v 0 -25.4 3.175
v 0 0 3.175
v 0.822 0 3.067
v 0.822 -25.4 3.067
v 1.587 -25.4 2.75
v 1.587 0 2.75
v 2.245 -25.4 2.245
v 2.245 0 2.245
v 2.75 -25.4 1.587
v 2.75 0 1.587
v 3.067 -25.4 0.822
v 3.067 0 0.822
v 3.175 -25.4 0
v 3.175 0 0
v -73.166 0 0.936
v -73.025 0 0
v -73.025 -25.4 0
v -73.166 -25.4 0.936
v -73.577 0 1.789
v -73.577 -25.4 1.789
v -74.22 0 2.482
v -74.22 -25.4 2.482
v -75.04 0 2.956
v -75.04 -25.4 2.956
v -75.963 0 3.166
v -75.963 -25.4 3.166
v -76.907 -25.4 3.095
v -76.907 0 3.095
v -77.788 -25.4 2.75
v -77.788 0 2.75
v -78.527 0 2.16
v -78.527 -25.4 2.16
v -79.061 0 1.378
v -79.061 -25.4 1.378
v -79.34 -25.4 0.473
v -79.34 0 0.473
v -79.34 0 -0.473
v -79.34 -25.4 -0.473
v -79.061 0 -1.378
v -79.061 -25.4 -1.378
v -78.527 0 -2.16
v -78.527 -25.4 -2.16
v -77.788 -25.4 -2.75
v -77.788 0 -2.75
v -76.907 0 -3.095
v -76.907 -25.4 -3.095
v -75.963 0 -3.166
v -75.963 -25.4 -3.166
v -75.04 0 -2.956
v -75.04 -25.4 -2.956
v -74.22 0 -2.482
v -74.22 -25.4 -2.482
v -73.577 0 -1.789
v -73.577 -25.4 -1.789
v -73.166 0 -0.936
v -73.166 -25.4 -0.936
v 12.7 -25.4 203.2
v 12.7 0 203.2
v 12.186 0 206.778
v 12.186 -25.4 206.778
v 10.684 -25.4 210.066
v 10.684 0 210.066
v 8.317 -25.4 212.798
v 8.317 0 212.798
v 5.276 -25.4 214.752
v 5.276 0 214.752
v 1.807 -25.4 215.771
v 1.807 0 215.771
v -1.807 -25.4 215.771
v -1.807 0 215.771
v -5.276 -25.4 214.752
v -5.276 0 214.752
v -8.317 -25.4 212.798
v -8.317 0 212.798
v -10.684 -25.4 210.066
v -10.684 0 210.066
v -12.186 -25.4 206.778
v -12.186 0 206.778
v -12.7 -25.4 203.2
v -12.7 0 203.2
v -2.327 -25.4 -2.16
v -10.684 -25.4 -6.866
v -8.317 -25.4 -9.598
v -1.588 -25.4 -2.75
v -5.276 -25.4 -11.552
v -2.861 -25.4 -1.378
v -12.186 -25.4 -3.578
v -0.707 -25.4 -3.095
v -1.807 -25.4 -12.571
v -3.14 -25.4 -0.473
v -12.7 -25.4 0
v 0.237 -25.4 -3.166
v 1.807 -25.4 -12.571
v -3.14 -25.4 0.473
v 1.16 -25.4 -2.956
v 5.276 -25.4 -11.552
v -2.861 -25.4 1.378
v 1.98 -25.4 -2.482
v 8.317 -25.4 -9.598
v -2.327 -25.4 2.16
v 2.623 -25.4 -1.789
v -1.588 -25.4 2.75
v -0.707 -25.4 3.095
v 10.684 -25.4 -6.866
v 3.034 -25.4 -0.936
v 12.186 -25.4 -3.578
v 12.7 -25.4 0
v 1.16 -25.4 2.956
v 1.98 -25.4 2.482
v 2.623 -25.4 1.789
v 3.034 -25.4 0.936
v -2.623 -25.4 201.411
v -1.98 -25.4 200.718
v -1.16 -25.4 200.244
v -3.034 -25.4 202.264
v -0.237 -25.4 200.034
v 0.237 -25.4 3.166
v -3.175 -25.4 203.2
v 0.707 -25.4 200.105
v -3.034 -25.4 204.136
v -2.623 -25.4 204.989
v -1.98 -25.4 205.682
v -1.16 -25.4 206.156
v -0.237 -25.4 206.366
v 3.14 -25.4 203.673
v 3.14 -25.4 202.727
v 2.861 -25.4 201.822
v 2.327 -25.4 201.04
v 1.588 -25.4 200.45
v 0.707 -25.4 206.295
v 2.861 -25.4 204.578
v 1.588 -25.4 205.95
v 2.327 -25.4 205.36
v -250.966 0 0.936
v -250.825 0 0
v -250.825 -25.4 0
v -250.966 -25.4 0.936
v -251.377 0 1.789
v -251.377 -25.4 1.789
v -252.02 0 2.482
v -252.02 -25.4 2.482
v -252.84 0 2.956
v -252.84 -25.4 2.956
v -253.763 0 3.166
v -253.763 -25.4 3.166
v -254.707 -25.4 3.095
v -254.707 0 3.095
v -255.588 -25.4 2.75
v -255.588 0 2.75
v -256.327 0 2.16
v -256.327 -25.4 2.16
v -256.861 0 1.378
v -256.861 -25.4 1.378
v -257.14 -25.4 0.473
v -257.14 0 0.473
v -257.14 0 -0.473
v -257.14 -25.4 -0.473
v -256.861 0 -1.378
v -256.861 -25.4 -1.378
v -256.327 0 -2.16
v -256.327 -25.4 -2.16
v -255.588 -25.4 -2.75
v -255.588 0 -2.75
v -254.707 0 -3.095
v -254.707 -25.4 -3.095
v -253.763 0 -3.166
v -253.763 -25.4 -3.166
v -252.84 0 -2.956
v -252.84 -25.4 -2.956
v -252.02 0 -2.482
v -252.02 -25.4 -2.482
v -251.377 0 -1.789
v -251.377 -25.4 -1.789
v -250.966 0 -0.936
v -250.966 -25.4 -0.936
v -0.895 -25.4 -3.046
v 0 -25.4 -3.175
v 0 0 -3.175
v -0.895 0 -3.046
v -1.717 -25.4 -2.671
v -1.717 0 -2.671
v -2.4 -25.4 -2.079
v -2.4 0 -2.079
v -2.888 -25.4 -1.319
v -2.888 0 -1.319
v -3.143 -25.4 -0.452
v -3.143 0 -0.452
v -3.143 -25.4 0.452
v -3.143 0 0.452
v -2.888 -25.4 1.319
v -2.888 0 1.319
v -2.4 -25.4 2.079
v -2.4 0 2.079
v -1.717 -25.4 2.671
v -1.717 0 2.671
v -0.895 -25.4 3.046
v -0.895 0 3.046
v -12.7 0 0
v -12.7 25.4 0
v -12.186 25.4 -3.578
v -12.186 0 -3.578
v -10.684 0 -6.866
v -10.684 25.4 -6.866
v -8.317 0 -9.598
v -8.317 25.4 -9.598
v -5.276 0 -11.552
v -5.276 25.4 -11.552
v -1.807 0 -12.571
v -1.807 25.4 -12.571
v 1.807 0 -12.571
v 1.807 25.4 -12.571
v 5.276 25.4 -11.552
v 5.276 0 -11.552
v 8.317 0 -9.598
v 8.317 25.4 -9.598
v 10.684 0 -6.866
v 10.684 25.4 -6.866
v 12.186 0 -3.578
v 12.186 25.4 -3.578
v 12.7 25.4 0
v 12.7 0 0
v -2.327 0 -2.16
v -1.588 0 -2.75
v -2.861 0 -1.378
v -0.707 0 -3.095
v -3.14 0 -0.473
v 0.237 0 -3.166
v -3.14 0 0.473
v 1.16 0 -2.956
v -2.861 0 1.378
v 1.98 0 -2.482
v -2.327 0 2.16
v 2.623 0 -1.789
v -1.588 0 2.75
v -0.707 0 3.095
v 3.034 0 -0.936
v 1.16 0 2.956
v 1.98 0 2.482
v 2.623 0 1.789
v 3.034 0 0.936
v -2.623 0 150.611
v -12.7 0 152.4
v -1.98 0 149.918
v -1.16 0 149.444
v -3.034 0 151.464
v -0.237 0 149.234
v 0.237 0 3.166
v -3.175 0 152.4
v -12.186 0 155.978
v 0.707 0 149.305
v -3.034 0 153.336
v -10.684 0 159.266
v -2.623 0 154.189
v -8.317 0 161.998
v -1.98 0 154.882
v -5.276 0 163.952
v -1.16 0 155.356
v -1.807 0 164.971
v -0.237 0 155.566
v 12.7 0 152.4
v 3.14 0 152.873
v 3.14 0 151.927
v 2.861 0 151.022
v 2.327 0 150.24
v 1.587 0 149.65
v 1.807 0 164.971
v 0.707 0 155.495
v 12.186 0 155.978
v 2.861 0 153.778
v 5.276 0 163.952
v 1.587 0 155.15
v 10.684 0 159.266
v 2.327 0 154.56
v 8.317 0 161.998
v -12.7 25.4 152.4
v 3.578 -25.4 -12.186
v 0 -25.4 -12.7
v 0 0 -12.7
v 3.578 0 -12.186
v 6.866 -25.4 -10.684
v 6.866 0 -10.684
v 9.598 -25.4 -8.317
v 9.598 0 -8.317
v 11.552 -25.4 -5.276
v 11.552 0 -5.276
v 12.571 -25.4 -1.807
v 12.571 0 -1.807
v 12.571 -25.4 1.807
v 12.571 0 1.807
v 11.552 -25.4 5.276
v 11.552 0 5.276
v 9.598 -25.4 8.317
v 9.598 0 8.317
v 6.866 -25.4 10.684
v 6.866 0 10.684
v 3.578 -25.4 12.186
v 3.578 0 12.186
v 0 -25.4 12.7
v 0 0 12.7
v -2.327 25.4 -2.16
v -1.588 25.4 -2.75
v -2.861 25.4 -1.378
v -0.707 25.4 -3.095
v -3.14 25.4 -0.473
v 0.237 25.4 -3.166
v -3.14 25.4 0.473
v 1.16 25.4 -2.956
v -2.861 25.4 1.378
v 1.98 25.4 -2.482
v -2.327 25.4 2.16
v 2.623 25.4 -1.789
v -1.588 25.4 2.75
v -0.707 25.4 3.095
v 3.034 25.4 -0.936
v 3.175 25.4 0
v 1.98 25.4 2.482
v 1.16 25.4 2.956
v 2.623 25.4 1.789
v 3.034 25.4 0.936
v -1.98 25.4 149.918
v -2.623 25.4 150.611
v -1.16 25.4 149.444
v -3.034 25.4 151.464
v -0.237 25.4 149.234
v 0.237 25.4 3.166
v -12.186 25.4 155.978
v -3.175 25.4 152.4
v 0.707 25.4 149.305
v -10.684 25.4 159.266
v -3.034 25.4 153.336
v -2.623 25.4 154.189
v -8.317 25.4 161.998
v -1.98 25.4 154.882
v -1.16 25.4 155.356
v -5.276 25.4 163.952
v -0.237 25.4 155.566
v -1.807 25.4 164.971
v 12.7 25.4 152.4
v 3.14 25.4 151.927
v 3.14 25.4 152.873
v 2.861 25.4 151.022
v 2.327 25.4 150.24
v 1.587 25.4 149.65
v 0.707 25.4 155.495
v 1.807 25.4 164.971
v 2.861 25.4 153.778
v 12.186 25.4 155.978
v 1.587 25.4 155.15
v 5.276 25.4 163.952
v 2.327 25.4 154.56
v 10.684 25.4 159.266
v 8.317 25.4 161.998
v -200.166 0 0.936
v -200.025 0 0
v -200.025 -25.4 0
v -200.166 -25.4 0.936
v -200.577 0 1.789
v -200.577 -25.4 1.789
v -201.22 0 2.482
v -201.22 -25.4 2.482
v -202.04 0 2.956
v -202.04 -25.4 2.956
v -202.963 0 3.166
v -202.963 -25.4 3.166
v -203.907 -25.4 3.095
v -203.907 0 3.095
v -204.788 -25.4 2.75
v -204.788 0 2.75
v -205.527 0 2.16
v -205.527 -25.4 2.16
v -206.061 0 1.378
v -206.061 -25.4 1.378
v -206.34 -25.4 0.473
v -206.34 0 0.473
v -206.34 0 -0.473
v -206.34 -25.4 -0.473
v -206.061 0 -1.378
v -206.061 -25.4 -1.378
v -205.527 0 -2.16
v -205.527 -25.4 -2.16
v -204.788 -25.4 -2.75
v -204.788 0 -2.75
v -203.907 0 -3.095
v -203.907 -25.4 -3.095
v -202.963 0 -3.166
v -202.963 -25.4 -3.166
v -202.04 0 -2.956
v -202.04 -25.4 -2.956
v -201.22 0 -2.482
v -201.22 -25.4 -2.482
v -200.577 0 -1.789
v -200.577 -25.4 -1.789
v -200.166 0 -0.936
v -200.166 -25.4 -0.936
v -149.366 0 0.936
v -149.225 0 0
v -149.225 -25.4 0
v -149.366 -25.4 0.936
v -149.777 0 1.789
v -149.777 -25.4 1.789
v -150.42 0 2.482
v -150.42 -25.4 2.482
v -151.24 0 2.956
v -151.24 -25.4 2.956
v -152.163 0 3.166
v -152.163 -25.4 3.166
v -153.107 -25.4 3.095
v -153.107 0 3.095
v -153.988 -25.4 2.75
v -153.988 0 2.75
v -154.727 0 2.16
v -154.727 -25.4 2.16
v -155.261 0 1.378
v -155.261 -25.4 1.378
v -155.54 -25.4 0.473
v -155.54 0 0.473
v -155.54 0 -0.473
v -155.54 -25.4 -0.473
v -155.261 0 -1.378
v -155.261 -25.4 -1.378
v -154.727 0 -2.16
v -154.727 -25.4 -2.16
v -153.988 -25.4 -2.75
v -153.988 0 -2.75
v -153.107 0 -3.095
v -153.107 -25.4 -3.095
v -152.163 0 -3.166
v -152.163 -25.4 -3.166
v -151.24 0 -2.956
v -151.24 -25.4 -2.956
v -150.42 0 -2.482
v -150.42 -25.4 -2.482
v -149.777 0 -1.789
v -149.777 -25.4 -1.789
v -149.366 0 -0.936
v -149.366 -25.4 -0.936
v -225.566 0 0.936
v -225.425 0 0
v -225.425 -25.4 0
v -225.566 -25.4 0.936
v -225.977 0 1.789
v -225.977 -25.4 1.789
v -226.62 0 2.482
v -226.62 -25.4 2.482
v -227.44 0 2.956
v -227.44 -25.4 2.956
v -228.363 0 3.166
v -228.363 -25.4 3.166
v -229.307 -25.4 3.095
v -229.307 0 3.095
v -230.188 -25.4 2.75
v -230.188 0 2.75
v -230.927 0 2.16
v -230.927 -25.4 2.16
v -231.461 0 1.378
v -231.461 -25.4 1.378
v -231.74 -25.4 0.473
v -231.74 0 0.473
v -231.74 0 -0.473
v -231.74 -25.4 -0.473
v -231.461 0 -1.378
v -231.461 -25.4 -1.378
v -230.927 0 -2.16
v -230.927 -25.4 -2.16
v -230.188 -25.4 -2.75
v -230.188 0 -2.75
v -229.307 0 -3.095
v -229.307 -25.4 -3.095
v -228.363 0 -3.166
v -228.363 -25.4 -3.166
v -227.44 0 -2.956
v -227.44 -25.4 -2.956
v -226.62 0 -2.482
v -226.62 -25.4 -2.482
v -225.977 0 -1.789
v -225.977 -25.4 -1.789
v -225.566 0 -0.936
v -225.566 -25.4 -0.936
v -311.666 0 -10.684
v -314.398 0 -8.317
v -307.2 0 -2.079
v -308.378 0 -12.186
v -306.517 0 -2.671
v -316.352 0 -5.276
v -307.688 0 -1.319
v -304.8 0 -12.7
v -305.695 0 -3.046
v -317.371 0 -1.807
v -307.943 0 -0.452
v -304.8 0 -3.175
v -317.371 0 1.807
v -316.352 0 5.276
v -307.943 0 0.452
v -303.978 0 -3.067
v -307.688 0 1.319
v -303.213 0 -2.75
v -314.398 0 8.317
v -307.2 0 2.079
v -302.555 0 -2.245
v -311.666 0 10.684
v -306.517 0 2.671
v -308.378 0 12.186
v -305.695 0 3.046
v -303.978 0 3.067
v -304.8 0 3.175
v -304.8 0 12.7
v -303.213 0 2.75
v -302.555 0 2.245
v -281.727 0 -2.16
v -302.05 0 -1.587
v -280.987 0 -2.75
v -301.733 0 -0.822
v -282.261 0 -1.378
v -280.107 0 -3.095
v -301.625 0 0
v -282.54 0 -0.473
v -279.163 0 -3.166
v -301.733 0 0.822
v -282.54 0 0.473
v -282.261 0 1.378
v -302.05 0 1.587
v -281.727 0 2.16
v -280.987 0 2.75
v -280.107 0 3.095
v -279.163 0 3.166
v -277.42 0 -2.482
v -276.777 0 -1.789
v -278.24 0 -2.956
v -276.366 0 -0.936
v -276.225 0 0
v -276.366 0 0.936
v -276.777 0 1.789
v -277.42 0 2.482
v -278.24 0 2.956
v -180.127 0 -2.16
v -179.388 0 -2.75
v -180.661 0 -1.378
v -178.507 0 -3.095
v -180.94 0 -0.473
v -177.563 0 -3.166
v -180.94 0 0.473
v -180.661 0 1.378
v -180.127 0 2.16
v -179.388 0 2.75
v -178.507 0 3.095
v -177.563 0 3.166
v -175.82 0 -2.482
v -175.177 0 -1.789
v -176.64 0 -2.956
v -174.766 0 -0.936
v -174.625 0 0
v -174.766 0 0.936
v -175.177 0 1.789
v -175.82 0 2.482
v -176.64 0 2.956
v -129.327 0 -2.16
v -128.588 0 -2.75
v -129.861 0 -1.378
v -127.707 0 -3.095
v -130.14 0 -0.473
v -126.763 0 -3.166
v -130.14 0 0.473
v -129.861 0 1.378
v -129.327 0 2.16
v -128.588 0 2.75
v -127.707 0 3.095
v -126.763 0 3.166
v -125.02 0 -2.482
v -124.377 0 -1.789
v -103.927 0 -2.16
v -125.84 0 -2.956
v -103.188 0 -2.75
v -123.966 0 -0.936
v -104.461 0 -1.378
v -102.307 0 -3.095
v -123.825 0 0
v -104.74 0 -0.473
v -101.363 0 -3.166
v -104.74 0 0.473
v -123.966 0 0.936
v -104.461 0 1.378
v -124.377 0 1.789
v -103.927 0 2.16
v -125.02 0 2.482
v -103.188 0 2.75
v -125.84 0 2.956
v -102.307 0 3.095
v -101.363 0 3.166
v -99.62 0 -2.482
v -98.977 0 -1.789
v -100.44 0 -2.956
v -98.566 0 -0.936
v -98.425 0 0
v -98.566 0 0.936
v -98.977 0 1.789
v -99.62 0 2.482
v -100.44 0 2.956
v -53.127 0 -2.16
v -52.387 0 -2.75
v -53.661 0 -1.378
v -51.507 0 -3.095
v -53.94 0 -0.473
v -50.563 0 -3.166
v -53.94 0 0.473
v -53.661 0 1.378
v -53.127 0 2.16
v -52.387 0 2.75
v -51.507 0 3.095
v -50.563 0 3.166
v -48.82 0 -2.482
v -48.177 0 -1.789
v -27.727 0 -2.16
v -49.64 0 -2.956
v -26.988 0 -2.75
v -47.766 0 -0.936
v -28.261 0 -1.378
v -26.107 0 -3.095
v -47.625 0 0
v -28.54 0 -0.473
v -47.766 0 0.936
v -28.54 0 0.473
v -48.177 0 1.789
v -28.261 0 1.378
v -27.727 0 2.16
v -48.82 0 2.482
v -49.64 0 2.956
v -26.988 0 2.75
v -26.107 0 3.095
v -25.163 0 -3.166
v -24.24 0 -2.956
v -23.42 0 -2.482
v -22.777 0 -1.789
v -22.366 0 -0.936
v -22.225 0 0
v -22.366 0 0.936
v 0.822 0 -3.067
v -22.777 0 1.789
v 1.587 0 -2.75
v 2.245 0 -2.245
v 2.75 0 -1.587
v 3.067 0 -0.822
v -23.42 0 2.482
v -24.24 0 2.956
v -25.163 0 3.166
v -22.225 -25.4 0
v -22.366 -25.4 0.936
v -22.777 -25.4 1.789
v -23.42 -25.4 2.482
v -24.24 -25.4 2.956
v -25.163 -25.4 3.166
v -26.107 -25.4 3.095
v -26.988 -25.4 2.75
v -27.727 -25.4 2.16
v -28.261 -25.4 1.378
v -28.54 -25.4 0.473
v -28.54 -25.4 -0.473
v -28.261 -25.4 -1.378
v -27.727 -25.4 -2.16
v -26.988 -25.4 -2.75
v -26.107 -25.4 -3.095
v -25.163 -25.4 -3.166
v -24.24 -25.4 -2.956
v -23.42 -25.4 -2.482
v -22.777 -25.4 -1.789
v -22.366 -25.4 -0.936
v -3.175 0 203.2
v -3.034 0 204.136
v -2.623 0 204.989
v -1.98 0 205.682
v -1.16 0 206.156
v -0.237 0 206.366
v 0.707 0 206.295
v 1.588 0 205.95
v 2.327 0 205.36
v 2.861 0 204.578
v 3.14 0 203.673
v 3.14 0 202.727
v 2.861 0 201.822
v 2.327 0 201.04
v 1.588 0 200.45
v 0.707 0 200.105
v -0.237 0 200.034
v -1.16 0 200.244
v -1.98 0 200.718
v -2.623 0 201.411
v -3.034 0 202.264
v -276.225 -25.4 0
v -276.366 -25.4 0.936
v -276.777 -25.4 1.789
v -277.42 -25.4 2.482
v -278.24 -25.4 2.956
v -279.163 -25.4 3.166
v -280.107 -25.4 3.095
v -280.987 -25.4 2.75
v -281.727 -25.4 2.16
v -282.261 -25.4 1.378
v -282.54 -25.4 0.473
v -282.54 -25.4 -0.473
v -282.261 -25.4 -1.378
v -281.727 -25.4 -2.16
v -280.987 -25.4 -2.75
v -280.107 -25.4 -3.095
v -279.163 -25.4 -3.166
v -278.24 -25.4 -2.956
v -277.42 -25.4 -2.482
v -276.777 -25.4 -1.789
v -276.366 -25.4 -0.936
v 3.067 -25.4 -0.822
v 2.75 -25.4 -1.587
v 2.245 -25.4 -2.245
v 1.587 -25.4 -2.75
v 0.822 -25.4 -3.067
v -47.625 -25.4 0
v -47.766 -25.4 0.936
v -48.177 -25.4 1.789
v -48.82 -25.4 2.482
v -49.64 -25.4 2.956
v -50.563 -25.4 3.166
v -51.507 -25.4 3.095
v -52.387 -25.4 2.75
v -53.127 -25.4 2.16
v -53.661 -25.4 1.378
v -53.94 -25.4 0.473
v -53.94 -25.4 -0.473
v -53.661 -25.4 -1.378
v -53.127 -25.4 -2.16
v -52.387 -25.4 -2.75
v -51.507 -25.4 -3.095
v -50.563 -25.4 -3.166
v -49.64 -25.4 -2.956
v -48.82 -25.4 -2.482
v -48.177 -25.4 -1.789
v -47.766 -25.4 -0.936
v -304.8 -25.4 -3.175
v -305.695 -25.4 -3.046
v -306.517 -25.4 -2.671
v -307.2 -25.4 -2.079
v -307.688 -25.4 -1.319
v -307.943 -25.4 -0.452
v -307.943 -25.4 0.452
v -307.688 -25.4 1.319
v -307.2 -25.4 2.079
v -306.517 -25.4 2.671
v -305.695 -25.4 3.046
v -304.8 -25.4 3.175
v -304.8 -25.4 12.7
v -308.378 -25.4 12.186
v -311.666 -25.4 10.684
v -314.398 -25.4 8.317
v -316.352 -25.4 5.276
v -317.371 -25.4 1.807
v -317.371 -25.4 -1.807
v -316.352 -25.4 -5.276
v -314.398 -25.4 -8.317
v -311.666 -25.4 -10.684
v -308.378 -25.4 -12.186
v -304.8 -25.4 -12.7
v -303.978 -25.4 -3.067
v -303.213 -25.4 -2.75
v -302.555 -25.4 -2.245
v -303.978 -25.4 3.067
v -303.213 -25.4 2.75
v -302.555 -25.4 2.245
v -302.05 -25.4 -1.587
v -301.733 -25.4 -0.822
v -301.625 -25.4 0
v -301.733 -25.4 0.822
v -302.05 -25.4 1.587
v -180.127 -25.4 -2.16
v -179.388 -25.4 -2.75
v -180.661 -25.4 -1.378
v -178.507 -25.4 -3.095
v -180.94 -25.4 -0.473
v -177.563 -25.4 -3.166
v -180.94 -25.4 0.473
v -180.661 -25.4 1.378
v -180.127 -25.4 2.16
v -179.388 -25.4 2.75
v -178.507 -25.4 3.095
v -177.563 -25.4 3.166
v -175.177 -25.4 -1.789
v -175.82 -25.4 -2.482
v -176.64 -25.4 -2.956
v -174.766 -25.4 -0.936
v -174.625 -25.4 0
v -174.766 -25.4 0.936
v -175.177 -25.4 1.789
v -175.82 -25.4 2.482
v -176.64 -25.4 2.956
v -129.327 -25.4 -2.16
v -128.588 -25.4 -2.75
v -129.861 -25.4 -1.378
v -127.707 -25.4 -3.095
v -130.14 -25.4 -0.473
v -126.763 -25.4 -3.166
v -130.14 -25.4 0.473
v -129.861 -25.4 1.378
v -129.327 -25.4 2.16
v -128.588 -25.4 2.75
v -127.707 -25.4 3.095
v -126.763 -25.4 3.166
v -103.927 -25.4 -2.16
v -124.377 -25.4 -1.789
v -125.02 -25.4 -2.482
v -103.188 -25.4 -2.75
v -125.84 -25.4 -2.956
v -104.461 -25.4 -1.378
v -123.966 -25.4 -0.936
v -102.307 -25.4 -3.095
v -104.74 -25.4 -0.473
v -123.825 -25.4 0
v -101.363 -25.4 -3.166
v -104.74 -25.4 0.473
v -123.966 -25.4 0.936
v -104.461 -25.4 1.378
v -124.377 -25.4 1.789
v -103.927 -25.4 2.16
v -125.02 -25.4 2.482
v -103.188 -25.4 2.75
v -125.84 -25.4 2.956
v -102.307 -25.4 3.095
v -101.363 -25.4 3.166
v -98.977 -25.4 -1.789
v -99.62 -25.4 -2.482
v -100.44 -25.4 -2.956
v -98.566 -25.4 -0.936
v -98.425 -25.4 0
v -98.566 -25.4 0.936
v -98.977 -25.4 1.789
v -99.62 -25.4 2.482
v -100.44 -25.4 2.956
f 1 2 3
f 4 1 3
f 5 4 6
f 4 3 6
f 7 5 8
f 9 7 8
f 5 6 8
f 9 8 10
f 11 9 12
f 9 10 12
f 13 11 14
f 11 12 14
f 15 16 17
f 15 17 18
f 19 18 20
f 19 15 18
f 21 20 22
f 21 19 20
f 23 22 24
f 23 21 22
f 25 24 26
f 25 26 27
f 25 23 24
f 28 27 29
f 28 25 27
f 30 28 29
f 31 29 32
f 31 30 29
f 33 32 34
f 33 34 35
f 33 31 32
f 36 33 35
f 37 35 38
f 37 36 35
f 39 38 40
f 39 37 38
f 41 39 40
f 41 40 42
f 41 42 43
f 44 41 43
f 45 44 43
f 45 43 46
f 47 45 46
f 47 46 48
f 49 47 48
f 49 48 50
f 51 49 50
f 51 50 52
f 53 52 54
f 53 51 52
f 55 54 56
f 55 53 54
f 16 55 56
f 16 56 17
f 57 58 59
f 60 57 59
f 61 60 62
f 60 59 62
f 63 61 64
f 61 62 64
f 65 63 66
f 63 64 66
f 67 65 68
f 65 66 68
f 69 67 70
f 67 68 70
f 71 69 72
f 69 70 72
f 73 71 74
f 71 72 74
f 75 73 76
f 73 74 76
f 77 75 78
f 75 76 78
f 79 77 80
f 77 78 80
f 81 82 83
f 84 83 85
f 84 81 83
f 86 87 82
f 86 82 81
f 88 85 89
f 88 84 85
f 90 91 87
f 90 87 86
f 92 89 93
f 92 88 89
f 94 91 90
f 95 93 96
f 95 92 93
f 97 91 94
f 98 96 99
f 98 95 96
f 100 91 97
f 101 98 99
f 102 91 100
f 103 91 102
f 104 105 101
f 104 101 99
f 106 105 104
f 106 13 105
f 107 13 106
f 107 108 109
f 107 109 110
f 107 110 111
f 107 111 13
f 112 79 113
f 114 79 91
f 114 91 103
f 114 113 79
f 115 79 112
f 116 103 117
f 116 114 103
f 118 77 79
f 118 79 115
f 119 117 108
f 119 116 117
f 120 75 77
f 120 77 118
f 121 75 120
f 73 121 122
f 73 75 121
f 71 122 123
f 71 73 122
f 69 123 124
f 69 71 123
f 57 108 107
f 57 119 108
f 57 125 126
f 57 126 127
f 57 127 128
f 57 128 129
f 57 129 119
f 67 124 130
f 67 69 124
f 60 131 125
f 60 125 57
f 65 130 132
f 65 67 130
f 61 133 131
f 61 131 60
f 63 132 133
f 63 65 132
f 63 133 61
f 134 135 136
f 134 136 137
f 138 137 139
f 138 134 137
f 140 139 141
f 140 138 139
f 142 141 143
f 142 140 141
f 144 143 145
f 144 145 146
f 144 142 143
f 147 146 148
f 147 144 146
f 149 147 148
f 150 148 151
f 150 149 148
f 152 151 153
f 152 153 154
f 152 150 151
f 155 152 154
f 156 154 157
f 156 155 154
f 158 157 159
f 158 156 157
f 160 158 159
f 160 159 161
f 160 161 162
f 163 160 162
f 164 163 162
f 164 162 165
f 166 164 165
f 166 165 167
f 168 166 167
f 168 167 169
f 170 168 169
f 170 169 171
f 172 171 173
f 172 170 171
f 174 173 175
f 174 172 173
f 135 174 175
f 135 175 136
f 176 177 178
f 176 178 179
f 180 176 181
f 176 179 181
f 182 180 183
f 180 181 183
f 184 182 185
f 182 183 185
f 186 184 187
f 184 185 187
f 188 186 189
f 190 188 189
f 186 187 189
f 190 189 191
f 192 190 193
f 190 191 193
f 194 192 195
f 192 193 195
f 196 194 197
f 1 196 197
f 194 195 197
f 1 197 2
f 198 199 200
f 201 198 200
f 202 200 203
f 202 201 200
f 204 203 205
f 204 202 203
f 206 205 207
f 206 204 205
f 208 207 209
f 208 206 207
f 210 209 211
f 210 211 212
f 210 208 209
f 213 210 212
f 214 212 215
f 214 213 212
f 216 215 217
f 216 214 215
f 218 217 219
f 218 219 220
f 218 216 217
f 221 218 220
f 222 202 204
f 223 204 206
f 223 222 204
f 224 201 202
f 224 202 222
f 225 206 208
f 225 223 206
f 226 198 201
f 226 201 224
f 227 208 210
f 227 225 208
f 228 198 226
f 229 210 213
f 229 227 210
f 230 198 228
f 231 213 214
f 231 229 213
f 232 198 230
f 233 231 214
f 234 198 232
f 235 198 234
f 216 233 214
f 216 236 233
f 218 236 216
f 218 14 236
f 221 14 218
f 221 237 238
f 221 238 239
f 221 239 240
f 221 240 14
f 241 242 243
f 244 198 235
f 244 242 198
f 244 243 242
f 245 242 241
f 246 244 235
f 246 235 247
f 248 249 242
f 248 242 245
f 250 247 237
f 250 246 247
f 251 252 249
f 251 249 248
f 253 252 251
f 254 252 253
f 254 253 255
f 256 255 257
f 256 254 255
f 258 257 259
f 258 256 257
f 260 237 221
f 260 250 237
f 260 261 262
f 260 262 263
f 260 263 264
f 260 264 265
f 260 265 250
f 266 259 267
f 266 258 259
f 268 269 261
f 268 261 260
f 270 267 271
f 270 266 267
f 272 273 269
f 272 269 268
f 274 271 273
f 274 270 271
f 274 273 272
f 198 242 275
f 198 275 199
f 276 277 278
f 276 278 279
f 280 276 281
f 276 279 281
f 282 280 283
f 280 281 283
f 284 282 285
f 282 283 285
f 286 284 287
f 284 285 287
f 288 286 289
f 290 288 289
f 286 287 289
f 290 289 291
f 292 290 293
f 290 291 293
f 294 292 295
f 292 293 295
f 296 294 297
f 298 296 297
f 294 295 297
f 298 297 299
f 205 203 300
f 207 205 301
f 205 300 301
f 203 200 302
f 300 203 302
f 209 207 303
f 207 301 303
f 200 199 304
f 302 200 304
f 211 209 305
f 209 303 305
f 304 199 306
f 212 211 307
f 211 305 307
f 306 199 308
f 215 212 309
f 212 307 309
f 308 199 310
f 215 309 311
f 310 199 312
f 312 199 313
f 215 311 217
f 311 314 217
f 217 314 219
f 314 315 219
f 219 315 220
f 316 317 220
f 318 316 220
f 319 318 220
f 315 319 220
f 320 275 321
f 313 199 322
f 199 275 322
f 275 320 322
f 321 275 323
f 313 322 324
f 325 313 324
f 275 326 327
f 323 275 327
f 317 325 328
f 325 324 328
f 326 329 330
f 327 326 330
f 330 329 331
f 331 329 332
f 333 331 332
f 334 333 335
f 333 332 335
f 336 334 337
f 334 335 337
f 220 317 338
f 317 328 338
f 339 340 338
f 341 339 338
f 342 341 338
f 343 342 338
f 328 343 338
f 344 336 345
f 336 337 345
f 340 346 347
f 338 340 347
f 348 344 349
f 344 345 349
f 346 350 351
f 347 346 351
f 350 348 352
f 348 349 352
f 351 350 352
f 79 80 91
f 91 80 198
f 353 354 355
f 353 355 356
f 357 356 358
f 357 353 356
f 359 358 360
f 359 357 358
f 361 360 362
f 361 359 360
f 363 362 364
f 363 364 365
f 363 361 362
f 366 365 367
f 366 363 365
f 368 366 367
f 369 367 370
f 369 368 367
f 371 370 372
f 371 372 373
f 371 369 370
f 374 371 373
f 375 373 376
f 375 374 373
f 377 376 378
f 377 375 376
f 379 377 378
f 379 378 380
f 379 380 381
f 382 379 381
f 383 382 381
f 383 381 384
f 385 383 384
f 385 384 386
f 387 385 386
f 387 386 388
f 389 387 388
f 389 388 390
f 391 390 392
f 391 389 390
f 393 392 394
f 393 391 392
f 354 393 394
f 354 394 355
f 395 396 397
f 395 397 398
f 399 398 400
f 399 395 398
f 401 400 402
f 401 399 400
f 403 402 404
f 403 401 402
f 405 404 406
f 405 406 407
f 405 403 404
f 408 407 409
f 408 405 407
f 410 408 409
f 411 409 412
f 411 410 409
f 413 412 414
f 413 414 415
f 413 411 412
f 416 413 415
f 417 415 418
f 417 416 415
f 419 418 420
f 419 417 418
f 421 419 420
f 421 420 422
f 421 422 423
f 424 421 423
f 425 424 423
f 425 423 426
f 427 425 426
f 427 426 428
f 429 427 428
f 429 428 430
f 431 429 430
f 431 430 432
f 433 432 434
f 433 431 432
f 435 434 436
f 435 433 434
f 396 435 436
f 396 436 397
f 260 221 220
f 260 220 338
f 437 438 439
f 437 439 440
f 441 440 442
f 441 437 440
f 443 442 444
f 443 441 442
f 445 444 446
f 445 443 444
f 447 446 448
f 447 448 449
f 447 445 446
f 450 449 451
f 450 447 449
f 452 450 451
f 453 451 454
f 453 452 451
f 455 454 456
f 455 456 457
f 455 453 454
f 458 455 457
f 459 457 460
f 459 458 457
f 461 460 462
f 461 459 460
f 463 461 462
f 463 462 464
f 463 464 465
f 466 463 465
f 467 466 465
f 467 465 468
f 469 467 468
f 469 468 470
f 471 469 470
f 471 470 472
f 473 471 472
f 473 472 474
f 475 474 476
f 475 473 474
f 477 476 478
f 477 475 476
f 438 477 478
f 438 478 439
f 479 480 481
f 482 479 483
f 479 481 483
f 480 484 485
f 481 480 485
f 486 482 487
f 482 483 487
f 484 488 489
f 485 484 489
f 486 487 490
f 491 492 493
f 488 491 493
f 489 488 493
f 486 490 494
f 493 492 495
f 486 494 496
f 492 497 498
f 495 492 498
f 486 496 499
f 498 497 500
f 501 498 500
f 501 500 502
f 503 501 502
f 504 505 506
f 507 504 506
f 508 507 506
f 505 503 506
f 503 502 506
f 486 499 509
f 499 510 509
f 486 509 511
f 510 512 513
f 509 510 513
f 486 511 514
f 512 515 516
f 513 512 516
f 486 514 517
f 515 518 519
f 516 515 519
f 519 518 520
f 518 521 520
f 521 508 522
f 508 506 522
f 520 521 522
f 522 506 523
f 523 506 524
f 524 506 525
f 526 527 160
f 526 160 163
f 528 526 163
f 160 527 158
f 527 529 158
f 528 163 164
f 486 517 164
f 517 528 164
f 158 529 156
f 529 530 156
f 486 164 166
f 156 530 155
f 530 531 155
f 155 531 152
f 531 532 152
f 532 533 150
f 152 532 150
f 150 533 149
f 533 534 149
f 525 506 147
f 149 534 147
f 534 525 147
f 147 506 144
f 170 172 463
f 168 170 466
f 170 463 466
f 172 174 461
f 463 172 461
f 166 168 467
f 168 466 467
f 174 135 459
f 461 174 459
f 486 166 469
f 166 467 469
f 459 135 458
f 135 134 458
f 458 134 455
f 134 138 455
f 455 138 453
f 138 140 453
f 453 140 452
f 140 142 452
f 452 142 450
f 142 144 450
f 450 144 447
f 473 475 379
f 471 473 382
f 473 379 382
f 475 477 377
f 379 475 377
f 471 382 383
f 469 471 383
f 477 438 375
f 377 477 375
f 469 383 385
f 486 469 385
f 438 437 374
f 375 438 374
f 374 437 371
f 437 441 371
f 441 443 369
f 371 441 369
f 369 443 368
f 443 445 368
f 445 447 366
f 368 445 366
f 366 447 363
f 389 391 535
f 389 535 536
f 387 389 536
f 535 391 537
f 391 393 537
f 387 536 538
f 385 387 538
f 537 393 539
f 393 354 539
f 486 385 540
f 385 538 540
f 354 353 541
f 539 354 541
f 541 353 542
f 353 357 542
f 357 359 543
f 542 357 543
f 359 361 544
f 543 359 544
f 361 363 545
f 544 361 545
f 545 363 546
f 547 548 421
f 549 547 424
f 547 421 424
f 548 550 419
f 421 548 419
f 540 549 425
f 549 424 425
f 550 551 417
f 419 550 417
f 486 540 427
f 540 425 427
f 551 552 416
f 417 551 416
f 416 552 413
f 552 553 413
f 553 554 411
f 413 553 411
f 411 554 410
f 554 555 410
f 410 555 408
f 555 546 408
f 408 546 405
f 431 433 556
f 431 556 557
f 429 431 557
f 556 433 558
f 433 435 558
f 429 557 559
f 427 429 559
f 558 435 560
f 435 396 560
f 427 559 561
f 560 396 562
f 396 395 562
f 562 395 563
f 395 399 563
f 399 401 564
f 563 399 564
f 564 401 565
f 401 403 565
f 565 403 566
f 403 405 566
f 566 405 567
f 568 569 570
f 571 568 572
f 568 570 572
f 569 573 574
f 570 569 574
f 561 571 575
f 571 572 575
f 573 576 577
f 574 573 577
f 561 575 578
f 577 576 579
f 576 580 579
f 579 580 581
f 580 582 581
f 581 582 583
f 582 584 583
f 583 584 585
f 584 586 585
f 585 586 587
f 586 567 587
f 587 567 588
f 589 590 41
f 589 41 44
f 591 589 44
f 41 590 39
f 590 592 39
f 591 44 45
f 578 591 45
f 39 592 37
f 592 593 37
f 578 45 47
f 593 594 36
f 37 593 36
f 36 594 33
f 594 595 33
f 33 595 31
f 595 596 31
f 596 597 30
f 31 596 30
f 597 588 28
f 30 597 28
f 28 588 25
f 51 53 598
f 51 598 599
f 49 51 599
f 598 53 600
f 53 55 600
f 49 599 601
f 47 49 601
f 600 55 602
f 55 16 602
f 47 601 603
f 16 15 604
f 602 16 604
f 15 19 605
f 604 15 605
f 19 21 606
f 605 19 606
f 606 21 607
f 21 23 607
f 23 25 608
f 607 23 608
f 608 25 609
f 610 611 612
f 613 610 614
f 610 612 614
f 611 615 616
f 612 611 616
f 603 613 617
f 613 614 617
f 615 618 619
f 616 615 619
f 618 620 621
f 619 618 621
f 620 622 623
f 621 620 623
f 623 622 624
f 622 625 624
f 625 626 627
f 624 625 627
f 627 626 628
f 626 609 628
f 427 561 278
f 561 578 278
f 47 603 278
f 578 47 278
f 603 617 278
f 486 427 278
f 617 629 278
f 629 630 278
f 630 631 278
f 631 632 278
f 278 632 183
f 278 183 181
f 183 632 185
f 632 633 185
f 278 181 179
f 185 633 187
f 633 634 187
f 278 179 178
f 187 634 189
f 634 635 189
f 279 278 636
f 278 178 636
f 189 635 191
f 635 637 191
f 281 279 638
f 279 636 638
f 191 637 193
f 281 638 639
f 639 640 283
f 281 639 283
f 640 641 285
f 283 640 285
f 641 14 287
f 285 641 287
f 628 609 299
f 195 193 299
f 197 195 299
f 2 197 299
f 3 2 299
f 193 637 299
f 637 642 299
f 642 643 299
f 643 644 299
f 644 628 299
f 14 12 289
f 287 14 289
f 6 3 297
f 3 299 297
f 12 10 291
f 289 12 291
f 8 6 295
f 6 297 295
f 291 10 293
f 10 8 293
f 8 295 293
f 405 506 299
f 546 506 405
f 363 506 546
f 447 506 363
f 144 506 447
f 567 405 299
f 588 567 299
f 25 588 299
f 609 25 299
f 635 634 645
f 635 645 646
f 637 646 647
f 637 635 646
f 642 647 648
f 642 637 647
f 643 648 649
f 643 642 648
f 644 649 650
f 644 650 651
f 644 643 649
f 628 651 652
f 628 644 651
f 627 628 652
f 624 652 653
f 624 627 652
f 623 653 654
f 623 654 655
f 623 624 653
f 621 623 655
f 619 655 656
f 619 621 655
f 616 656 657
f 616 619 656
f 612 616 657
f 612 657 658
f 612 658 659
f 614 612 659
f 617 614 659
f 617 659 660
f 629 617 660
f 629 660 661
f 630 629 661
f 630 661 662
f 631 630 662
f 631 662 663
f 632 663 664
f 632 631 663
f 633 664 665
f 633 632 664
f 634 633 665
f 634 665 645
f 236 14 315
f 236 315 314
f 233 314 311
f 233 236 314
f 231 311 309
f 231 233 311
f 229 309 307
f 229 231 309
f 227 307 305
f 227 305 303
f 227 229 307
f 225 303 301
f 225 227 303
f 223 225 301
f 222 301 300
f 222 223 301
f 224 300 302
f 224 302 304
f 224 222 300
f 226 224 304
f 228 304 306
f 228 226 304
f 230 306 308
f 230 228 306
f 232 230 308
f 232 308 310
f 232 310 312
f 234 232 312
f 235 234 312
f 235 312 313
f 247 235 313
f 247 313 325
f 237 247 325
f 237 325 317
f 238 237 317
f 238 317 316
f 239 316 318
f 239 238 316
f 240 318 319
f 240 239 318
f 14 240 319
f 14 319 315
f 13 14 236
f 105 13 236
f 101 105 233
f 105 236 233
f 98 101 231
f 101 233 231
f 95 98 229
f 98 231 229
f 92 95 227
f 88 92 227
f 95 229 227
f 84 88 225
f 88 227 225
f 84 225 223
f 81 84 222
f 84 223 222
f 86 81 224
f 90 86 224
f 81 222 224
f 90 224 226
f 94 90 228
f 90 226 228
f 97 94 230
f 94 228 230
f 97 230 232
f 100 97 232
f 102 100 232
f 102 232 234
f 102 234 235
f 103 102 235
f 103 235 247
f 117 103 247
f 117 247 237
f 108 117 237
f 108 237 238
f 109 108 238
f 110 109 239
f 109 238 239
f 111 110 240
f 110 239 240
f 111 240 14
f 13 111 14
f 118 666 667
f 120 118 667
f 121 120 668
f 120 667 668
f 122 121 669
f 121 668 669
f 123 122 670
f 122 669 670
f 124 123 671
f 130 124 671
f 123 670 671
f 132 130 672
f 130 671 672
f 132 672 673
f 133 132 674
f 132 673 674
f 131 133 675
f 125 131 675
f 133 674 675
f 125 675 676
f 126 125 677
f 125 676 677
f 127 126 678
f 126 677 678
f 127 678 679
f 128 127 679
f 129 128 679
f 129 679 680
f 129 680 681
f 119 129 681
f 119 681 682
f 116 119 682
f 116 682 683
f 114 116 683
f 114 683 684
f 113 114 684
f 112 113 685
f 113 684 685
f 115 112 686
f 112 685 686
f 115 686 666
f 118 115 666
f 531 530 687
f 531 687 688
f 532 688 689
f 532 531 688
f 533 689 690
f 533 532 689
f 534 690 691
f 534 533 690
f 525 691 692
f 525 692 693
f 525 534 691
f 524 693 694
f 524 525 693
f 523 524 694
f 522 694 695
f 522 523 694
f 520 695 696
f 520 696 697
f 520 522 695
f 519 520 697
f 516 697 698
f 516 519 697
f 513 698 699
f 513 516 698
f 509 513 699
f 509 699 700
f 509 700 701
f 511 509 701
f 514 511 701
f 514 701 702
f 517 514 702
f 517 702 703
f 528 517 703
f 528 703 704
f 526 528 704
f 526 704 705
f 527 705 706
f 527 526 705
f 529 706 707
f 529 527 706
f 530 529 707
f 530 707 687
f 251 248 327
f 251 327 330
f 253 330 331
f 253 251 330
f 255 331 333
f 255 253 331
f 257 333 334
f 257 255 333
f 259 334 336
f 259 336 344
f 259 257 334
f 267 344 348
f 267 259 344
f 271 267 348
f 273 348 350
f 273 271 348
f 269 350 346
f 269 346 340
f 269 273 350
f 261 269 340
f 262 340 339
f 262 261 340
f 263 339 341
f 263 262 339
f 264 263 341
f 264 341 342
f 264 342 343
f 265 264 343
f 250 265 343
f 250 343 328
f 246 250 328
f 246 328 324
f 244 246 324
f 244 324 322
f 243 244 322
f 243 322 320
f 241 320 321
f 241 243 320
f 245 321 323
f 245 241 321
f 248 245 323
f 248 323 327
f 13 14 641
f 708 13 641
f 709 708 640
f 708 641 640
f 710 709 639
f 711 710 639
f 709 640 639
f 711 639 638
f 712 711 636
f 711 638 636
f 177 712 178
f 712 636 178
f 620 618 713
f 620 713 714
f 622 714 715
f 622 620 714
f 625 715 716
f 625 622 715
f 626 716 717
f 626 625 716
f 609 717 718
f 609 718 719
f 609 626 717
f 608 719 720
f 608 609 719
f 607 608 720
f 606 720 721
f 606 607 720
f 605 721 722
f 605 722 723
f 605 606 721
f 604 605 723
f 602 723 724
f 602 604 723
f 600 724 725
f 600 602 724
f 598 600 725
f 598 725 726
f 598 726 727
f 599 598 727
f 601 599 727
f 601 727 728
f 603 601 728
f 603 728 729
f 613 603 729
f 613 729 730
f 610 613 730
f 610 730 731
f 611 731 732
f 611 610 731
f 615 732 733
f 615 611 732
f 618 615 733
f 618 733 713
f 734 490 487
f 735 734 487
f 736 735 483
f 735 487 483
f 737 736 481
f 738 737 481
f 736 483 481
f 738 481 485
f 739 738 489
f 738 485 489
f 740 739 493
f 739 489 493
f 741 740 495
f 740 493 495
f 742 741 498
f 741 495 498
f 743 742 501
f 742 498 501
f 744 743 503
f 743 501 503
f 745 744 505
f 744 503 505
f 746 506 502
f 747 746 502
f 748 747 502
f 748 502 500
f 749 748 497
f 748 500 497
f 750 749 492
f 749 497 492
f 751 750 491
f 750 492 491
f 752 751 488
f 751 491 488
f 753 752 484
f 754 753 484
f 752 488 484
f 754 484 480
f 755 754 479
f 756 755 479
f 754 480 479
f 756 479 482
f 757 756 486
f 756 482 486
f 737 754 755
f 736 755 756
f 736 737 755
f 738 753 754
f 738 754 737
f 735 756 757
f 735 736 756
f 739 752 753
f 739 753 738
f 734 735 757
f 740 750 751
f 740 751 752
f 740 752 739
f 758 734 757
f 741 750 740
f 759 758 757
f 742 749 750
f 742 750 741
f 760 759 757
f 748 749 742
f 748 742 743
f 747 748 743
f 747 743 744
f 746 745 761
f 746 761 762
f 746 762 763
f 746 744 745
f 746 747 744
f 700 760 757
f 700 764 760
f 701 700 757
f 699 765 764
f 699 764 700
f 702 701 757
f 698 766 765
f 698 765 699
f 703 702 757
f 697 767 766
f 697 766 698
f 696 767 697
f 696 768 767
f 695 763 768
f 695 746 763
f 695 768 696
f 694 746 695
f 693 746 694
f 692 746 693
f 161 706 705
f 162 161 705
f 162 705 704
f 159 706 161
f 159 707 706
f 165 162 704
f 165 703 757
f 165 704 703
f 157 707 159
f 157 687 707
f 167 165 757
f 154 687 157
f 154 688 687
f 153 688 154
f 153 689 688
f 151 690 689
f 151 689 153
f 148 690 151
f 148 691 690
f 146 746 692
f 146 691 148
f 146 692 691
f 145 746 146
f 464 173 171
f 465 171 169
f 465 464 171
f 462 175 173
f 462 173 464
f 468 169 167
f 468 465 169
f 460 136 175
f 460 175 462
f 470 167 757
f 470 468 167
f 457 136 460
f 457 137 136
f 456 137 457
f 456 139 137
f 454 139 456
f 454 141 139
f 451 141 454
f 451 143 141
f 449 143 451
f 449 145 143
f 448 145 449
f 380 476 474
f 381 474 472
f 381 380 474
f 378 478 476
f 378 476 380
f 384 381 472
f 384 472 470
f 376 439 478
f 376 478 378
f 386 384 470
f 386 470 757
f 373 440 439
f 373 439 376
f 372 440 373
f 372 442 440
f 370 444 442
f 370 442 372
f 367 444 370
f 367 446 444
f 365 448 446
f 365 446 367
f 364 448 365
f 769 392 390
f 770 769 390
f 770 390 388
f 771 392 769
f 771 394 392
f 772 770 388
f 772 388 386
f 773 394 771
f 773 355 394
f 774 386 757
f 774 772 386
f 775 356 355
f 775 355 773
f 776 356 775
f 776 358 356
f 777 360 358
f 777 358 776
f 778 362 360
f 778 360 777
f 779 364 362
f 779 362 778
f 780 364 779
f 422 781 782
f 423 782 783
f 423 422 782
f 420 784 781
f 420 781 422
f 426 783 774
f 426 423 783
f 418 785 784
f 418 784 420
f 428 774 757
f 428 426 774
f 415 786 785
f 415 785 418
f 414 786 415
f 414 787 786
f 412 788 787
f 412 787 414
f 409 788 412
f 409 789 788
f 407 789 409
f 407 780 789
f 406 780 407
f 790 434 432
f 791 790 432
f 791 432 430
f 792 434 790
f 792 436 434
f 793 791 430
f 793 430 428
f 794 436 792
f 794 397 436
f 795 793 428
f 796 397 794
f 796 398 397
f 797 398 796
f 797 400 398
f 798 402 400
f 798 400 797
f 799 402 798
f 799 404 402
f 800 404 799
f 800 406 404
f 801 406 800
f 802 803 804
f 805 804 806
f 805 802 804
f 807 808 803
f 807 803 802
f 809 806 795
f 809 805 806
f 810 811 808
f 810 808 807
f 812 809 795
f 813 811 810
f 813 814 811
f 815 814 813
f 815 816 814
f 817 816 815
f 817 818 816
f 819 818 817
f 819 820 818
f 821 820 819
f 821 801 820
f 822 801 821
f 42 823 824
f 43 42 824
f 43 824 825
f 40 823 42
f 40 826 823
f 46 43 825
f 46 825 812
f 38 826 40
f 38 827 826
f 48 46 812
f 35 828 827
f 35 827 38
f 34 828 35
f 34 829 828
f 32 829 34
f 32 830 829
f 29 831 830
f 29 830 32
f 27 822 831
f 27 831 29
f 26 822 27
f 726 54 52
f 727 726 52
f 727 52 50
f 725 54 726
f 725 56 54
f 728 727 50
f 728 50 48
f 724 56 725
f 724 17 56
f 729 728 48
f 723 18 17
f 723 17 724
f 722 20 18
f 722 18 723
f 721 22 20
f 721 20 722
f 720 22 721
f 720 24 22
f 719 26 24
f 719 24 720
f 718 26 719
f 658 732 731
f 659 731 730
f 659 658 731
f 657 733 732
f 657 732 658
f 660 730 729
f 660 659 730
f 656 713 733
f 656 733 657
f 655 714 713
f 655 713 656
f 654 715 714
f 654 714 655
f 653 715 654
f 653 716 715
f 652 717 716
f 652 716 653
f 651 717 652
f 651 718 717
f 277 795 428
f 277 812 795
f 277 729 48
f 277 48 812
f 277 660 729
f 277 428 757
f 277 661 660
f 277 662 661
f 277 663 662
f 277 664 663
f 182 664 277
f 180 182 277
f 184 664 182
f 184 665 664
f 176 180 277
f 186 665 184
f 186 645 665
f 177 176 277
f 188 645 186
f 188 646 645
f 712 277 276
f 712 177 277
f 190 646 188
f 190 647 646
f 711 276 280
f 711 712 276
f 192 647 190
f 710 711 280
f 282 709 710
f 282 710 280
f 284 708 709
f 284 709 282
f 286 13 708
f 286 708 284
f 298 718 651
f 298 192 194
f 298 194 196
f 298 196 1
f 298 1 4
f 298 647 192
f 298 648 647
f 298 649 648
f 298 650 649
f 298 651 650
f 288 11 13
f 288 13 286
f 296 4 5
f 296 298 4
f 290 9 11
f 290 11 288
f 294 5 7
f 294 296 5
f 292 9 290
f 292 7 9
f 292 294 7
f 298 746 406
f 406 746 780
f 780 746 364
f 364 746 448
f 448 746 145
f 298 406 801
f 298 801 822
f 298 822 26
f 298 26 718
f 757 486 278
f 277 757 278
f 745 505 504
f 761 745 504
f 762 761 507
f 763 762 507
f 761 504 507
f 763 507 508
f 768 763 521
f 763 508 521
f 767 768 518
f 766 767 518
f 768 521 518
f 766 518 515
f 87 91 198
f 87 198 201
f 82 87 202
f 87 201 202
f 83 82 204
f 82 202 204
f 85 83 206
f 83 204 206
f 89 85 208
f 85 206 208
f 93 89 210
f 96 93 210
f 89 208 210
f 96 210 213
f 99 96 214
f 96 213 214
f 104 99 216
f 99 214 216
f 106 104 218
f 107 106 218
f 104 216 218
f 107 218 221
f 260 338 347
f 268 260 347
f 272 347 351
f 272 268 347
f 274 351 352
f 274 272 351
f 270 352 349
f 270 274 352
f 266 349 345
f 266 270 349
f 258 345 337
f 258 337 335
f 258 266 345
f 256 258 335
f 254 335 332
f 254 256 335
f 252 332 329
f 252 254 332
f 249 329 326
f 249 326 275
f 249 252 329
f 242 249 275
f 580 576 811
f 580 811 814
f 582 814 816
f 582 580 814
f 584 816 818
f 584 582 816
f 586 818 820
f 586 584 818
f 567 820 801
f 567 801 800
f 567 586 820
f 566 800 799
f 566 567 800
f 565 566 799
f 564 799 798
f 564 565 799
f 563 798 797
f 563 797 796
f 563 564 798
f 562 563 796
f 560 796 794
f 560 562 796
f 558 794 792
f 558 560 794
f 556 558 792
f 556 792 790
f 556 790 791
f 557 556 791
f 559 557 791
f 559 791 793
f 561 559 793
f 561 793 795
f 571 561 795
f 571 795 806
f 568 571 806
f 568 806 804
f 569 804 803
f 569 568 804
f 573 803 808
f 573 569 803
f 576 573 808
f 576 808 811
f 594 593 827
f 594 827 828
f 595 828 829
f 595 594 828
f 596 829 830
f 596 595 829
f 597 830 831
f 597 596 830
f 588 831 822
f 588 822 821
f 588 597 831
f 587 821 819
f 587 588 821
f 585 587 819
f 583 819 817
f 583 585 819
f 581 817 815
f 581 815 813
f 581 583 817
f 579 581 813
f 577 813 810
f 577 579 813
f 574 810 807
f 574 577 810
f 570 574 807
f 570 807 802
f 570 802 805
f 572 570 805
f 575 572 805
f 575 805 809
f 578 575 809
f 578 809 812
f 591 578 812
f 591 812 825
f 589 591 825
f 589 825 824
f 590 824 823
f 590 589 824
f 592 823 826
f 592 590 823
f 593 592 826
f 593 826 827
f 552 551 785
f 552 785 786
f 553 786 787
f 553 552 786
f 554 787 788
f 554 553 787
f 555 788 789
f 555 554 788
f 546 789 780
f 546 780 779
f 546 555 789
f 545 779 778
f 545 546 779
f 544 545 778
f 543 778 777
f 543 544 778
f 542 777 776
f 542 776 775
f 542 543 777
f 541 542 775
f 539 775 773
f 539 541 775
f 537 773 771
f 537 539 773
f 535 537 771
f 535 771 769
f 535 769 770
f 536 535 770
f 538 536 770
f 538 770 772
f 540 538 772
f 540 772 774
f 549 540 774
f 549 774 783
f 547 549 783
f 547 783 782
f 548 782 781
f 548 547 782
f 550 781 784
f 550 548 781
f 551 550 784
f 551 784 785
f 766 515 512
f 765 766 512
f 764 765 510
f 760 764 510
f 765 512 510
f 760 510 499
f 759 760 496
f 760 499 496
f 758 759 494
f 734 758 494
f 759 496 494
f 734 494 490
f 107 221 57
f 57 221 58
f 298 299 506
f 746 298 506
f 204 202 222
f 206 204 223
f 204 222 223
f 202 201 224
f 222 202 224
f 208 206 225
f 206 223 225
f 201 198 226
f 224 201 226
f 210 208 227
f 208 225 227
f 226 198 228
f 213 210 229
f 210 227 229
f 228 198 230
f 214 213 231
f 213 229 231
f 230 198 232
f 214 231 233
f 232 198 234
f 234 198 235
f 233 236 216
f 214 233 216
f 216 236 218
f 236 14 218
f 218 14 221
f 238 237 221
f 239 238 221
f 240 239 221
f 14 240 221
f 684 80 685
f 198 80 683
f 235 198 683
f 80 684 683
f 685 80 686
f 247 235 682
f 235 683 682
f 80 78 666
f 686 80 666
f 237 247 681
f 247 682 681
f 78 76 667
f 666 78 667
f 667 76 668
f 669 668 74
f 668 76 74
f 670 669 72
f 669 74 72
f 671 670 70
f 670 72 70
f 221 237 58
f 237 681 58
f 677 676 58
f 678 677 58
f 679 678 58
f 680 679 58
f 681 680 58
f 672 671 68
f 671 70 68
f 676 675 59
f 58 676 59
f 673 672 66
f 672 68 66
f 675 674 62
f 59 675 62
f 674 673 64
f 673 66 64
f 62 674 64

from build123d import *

# Parameters (mm, degrees)
F1_DEPTH = 25.4
F3_DEPTH = 25.4
F4_R     = 3.175
F5_DEPTH = 25.4


with BuildPart() as f1:
    # F0 (on Front) → F1 (new body)
    with BuildSketch(Plane.XZ):
        with BuildLine():
            ThreePointArc((-3.175, 0), (0, 3.175), (3.175, 0))
            Line((3.175, 0), (12.7, 0))
            Line((12.7, 0), (12.7, 203.2))
            Line((12.7, 203.2), (3.175, 203.2))
            ThreePointArc((3.175, 203.2), (0, 200.025), (-3.175, 203.2))
            Line((-3.175, 203.2), (-12.7, 203.2))
            Line((-12.7, 203.2), (-12.7, 0))
            Line((-12.7, 0), (-3.175, 0))
        make_face()
        with BuildLine():
            Line((12.7, 0), (3.175, 0))
            ThreePointArc((3.175, 0), (0, -3.175), (-3.175, 0))
            Line((-3.175, 0), (-12.7, 0))
            ThreePointArc((-12.7, 0), (0, -12.7), (12.7, 0))
        make_face()
        with BuildLine():
            Line((3.175, 203.2), (12.7, 203.2))
            ThreePointArc((12.7, 203.2), (0, 215.9), (-12.7, 203.2))
            Line((-12.7, 203.2), (-3.175, 203.2))
            ThreePointArc((-3.175, 203.2), (0, 206.375), (3.175, 203.2))
        make_face()
    extrude(amount=F1_DEPTH)


with BuildPart() as f3:
    # F2 (on Front) → F3 (new body)
    with BuildSketch(Plane.XZ):
        with BuildLine():
            ThreePointArc((-3.175, 0), (0, 3.175), (3.175, 0))
            Line((3.175, 0), (12.7, 0))
            Line((12.7, 0), (12.7, 152.4))
            Line((12.7, 152.4), (3.175, 152.4))
            ThreePointArc((3.175, 152.4), (0, 149.225), (-3.175, 152.4))
            Line((-3.175, 152.4), (-12.7, 152.4))
            Line((-12.7, 152.4), (-12.7, 0))
            Line((-12.7, 0), (-3.175, 0))
        make_face()
        with BuildLine():
            Line((12.7, 0), (3.175, 0))
            ThreePointArc((3.175, 0), (0, -3.175), (-3.175, 0))
            Line((-3.175, 0), (-12.7, 0))
            ThreePointArc((-12.7, 0), (0, -12.7), (12.7, 0))
        make_face()
        with BuildLine():
            Line((3.175, 152.4), (12.7, 152.4))
            ThreePointArc((12.7, 152.4), (0, 165.1), (-12.7, 152.4))
            Line((-12.7, 152.4), (-3.175, 152.4))
            ThreePointArc((-3.175, 152.4), (0, 155.575), (3.175, 152.4))
        make_face()
    extrude(amount=-F3_DEPTH)


with BuildPart() as f5:
    # F4 (on Front) → F5 (new body)
    with BuildSketch(Plane.XZ):
        with BuildLine():
            Line((0, 3.175), (0, 12.7))
            Line((0, 12.7), (-304.8, 12.7))
            Line((-304.8, 12.7), (-304.8, 3.175))
            ThreePointArc((-304.8, 3.175), (-302.554936, 2.245064), (-301.625, 0))
            ThreePointArc((-301.625, 0), (-302.554936, -2.245064), (-304.8, -3.175))
            Line((-304.8, -3.175), (-304.8, -12.7))
            Line((-304.8, -12.7), (0, -12.7))
            Line((0, -12.7), (0, -3.175))
            ThreePointArc((0, -3.175), (-3.175, 0), (0, 3.175))
        make_face()
        with Locations((-279.4, 0)):
            Circle(F4_R, mode=Mode.SUBTRACT)
        with Locations((-254, 0)):
            Circle(F4_R, mode=Mode.SUBTRACT)
        with Locations((-228.6, 0)):
            Circle(F4_R, mode=Mode.SUBTRACT)
        with Locations((-203.2, 0)):
            Circle(F4_R, mode=Mode.SUBTRACT)
        with Locations((-177.8, 0)):
            Circle(F4_R, mode=Mode.SUBTRACT)
        with Locations((-152.4, 0)):
            Circle(F4_R, mode=Mode.SUBTRACT)
        with Locations((-127, 0)):
            Circle(F4_R, mode=Mode.SUBTRACT)
        with Locations((-101.6, 0)):
            Circle(F4_R, mode=Mode.SUBTRACT)
        with Locations((-76.2, 0)):
            Circle(F4_R, mode=Mode.SUBTRACT)
        with Locations((-50.8, 0)):
            Circle(F4_R, mode=Mode.SUBTRACT)
        with Locations((-25.4, 0)):
            Circle(F4_R, mode=Mode.SUBTRACT)
        with BuildLine():
            ThreePointArc((0, -12.7), (12.7, 0), (0, 12.7))
            Line((0, 12.7), (0, 3.175))
            ThreePointArc((0, 3.175), (2.245064, 2.245064), (3.175, 0))
            ThreePointArc((3.175, 0), (2.245064, -2.245064), (0, -3.175))
            Line((0, -3.175), (0, -12.7))
        make_face()
        with BuildLine():
            Line((-304.8, 3.175), (-304.8, 12.7))
            ThreePointArc((-304.8, 12.7), (-317.5, 0), (-304.8, -12.7))
            Line((-304.8, -12.7), (-304.8, -3.175))
            ThreePointArc((-304.8, -3.175), (-307.975, 0), (-304.8, 3.175))
        make_face()
    extrude(amount=F5_DEPTH)


solid = Compound([f1.part, f3.part, f5.part])
